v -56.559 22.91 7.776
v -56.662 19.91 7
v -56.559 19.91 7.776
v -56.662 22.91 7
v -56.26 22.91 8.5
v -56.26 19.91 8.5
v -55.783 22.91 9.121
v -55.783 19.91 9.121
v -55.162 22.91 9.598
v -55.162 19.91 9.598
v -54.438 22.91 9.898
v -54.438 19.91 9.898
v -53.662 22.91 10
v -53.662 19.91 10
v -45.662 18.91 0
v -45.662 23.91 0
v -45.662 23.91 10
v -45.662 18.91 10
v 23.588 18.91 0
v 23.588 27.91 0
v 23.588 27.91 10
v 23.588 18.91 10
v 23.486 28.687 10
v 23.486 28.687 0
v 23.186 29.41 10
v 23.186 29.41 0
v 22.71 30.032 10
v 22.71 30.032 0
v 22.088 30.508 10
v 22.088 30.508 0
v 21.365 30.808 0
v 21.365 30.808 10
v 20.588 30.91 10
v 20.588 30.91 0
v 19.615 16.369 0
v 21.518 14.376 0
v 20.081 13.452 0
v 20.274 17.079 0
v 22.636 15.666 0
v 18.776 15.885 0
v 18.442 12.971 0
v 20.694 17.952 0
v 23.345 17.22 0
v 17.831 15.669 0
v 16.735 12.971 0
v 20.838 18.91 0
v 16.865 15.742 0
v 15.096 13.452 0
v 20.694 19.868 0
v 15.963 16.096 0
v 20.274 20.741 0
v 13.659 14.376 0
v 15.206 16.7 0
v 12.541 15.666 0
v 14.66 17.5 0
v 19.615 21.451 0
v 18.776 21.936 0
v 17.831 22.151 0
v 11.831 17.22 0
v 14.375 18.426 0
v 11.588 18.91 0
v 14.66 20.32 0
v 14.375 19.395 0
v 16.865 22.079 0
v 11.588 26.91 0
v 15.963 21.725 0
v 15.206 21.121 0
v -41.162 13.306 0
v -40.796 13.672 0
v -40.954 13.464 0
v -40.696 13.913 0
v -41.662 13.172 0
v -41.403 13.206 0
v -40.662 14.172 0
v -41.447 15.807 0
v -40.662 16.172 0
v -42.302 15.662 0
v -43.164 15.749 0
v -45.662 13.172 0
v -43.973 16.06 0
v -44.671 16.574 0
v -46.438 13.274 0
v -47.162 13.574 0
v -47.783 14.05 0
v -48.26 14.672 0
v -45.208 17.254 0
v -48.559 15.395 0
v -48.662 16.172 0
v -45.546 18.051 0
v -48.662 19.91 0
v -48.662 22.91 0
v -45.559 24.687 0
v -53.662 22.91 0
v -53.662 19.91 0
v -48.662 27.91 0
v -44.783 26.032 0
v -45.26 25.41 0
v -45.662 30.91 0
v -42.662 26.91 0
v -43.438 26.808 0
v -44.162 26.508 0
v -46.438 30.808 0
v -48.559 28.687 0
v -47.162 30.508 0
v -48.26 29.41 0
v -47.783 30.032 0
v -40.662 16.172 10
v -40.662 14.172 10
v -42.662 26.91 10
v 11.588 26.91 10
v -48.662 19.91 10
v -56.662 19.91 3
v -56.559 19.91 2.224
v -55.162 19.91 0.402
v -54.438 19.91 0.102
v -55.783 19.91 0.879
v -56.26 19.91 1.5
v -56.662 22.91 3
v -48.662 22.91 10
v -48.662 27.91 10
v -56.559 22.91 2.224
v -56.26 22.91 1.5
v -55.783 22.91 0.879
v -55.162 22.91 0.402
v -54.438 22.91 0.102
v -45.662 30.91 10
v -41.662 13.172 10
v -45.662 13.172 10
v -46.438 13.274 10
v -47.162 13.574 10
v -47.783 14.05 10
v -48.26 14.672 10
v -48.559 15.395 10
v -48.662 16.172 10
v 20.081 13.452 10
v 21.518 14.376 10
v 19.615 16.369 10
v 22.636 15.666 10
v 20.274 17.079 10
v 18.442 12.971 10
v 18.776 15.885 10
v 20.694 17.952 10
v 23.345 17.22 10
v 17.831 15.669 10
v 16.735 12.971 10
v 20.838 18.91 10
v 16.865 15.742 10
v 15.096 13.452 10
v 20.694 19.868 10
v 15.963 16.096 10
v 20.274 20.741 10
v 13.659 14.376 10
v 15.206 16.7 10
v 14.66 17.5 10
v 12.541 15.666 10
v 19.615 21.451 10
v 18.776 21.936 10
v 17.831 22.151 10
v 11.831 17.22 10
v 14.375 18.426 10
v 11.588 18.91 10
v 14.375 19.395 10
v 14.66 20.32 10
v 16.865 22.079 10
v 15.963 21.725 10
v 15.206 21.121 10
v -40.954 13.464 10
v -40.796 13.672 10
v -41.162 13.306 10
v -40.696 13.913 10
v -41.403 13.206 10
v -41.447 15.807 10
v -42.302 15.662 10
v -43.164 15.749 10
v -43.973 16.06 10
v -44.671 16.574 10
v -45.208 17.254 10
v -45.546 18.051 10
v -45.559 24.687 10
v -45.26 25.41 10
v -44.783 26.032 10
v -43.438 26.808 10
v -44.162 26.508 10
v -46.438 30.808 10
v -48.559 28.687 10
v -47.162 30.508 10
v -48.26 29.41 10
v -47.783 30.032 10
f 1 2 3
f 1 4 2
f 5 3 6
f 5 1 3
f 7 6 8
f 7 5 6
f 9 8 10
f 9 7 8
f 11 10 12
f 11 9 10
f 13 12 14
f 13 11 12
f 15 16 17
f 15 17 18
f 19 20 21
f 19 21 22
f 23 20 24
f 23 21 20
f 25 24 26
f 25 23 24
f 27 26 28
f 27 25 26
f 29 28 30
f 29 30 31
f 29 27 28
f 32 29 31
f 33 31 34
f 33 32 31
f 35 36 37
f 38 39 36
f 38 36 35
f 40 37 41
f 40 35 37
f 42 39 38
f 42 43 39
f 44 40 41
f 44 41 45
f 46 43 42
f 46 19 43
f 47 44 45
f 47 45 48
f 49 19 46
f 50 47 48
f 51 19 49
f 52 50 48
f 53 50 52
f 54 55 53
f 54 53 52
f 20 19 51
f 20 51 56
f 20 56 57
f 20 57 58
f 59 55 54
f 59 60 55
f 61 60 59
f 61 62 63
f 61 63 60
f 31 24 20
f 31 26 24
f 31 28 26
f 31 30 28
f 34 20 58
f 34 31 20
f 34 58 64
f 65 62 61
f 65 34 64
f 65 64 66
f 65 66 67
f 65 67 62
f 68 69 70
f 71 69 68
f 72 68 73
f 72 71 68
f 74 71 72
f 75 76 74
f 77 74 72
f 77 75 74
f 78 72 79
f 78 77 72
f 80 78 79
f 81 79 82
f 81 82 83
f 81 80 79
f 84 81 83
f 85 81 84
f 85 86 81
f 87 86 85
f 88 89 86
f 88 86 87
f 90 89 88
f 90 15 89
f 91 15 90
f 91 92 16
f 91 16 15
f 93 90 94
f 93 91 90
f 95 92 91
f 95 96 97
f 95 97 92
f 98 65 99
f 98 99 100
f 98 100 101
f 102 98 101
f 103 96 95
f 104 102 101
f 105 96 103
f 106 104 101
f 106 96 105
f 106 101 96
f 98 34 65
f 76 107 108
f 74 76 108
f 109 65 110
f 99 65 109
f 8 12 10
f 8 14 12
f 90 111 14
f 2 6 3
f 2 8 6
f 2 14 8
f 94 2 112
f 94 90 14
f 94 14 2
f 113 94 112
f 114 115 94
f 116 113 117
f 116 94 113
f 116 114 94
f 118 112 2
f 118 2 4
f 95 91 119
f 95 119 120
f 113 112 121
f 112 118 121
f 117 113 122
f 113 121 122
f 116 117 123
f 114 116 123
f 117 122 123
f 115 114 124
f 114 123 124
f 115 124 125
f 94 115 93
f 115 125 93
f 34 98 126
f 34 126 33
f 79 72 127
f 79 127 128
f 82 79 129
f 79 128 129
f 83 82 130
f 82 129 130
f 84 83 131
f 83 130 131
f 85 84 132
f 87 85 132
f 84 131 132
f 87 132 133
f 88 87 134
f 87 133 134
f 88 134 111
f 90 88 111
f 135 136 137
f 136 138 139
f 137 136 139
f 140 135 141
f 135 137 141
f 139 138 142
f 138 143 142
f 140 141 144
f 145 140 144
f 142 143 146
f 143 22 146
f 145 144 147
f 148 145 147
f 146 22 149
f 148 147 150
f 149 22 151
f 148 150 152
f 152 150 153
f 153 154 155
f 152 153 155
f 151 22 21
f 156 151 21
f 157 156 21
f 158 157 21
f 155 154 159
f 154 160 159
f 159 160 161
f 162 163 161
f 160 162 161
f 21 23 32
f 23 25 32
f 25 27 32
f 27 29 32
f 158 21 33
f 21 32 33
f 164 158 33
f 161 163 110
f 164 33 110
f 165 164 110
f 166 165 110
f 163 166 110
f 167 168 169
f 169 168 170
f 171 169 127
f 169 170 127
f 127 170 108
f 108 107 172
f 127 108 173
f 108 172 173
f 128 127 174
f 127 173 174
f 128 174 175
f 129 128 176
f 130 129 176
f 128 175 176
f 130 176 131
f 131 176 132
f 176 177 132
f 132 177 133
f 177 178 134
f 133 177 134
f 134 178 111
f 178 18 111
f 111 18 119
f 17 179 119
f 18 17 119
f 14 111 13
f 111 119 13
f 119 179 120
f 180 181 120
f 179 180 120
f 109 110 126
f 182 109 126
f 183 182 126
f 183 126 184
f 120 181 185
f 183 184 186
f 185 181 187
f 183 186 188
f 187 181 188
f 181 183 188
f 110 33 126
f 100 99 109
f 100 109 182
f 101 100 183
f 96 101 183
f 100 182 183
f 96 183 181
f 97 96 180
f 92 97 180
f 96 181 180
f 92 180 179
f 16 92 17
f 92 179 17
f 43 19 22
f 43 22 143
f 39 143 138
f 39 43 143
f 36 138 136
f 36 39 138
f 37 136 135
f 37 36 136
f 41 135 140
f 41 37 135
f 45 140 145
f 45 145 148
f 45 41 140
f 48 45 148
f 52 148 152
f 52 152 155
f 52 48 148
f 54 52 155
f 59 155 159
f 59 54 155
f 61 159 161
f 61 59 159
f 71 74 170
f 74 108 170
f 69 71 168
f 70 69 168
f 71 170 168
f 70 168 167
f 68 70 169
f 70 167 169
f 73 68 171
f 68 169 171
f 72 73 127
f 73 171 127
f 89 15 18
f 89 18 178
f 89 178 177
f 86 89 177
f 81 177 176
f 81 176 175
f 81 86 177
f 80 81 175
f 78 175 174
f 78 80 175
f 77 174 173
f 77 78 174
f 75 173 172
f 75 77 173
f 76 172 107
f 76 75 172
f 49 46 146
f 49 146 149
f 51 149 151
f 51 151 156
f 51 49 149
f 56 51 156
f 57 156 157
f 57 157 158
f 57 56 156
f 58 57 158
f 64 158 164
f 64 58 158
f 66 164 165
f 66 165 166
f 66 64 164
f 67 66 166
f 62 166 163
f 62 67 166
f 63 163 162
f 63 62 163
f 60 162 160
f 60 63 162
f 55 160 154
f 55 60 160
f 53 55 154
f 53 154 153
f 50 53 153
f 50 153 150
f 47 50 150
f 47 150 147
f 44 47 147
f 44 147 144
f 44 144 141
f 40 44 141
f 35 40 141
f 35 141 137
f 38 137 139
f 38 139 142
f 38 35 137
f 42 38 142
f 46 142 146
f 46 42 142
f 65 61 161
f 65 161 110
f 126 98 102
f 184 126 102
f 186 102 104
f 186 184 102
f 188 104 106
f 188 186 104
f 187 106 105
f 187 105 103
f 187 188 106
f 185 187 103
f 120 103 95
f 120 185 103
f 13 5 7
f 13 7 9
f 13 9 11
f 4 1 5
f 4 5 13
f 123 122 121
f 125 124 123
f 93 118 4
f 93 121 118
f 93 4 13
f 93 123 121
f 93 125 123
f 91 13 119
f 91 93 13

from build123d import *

# Parameters (mm, degrees)
ESQUISSE1_R        = 3.25
BOSS_EXTRU_1_DEPTH = 10
CONG_1_R           = 3
CONG_2_R           = 1


with BuildPart() as part:
    # Esquisse1 → Boss.-Extru.1 (new body)
    with BuildSketch(Plane.XY):
        with BuildLine():
            Line((11.588403104, 18.910210832), (11.588403104, 26.910210832))
            Line((11.588403104, 26.910210832), (-45.661596896, 26.910210832))
            Line((-45.661596896, 26.910210832), (-45.661596896, 18.910210832))
            ThreePointArc((-45.661596896, 18.910210832), (-43.972846395, 16.059772269), (-40.661596896, 16.171598045))
            Line((-40.661596896, 16.171598045), (-40.661596896, 13.171598045))
            Line((-40.661596896, 13.171598045), (-48.661596896, 13.171598045))
            Line((-48.661596896, 13.171598045), (-48.661596896, 19.910210832))
            Line((-48.661596896, 19.910210832), (-56.661596896, 19.910210832))
            Line((-56.661596896, 19.910210832), (-56.661596896, 22.910210832))
            Line((-56.661596896, 22.910210832), (-48.661596896, 22.910210832))
            Line((-48.661596896, 22.910210832), (-48.661596896, 30.910210832))
            Line((-48.661596896, 30.910210832), (23.588403104, 30.910210832))
            Line((23.588403104, 30.910210832), (23.588403104, 18.910210832))
            ThreePointArc((23.588403104, 18.910210832), (17.588403104, 12.910210832), (11.588403104, 18.910210832))
        make_face()
        with Locations((17.588403104, 18.910210832)):
            Circle(ESQUISSE1_R, mode=Mode.SUBTRACT)
    extrude(amount=BOSS_EXTRU_1_DEPTH)

    # Congé1
    cong_1_edges = [part.edges().sort_by_distance(p)[0] for p in [
        (-56.661596896, 21.410210832, 0),
        (-48.661596896, 30.910210832, 5),
        (23.588403104, 30.910210832, 5),
        (-45.661596896, 26.910210832, 5),
        (-48.661596896, 13.171598045, 5),
        (-56.661596896, 21.410210832, 10),
    ]]
    fillet(cong_1_edges, radius=CONG_1_R)

    # Congé2
    cong_2_edges = [part.edges().sort_by_distance(p)[0] for p in [
        (-40.661596896, 13.171598045, 5),
    ]]
    fillet(cong_2_edges, radius=CONG_2_R)


solid = part.part
